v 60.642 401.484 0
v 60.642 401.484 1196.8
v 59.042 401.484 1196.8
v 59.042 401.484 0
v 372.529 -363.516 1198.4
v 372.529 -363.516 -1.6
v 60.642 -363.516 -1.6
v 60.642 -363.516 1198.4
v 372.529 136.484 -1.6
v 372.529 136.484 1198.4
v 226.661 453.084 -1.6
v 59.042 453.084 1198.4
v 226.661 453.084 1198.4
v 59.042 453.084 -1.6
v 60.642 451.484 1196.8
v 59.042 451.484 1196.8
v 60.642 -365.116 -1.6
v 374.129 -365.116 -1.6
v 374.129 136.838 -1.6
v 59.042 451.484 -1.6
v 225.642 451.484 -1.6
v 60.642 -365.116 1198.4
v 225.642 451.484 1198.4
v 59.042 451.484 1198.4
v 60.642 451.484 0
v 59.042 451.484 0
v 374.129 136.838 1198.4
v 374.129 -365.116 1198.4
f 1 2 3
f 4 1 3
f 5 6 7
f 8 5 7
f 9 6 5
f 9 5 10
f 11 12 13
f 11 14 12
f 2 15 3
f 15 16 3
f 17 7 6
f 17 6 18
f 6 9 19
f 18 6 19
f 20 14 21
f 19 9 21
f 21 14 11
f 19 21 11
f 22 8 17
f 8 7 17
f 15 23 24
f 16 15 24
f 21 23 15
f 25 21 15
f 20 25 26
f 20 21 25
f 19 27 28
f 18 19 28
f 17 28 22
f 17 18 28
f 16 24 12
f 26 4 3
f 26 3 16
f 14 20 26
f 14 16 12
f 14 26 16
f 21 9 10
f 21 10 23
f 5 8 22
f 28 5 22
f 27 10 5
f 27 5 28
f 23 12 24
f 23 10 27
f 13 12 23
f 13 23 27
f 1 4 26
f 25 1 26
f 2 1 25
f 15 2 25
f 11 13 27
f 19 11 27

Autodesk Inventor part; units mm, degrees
ref_plane "YZ Plane" through (0, 0, 0) normal (1, 0, 0) x (0, 1, 0)
ref_plane "XZ Plane" through (0, 0, 0) normal (0, 1, 0) x (-1, 0, 0)
ref_plane "XY Plane" through (0, 0, 0) normal (0, 0, 1) x (1, 0, 0)
ref_plane "Work Plane1" through (0, 0, 0) normal (0, 0, 1) x (1, 0, 0)
sketch "Sketch1" plane through (0, 0, 0) normal (0, 0, 1) x (1, 0, 0)
  line L0 (372.5286, -363.5164) -> (372.5286, 136.4836) projected
  line L1 (372.5286, 136.4836) -> (225.6417, 451.4836) projected
  line L2 (225.6417, 451.4836) -> (-104.3583, 451.4836) construction
  line L3 (-185.3519, -363.5164) -> (372.5286, -363.5164) construction
  line L4 (225.6417, 451.4836) -> (60.6417, 451.4836)
  line L5 (60.6417, 401.4836) -> (60.6417, 451.4836)
  line L6 (372.5286, -363.5164) -> (60.6417, -363.5164)
  line L7 (60.6417, 401.4836) -> (60.6417, -363.5164) construction
  line L8 (59.0417, 453.0836) -> (226.661, 453.0836)
  line L9 (226.661, 453.0836) -> (374.1286, 136.8383)
  line L10 (374.1286, 136.8383) -> (374.1286, -365.1164)
  line L11 (374.1286, -365.1164) -> (60.6417, -365.1164)
  line L12 (60.6417, -363.5164) -> (60.6417, -365.1164)
  line L13 (60.6417, 401.4836) -> (59.0417, 401.4836)
  line L14 (59.0417, 401.4836) -> (59.0417, 453.0836)
  point P0 (0, 0)
  dimension "d0" = 50
  dimension "d1" = 1.6
  dimension "d2" = 1.6
  dimension "d3" = 816.6
  dimension "d4" = 816.6
extrude "Extrusion1" add sketch "Sketch1" along normal blind 1198.4 and the other way blind 1.6
sketch "Sketch2" plane through (59.0417, 401.4836, -1.6) normal (-1, 0, 0) x (0, 0, 1)
  line L0 (0, 0) -> (0, 51.6) projected
  line L1 (1200, 0) -> (0, 0) projected
  line L2 (0, 50) -> (0, 0)
  line L3 (0, 0) -> (1.6, 0)
  line L4 (1.6, 0) -> (1.6, 50)
  line L5 (0, 50) -> (1.6, 50) projected
  point P0 (1.6, -401.4836)
  point P1 (0, 50)
  dimension "d14" = 1.6
extrude "Extrusion2" cut sketch "Sketch2" against normal blind 1.6
ref_plane "Work Plane2" through (0, 0, 598.4) normal (0, 0, 1) x (1, 0, 0)
mirror "Mirror1" about plane through (0, 0, 598.4) normal (0, 0, 1) of "Extrusion2"
properties part number "Back Cover"
